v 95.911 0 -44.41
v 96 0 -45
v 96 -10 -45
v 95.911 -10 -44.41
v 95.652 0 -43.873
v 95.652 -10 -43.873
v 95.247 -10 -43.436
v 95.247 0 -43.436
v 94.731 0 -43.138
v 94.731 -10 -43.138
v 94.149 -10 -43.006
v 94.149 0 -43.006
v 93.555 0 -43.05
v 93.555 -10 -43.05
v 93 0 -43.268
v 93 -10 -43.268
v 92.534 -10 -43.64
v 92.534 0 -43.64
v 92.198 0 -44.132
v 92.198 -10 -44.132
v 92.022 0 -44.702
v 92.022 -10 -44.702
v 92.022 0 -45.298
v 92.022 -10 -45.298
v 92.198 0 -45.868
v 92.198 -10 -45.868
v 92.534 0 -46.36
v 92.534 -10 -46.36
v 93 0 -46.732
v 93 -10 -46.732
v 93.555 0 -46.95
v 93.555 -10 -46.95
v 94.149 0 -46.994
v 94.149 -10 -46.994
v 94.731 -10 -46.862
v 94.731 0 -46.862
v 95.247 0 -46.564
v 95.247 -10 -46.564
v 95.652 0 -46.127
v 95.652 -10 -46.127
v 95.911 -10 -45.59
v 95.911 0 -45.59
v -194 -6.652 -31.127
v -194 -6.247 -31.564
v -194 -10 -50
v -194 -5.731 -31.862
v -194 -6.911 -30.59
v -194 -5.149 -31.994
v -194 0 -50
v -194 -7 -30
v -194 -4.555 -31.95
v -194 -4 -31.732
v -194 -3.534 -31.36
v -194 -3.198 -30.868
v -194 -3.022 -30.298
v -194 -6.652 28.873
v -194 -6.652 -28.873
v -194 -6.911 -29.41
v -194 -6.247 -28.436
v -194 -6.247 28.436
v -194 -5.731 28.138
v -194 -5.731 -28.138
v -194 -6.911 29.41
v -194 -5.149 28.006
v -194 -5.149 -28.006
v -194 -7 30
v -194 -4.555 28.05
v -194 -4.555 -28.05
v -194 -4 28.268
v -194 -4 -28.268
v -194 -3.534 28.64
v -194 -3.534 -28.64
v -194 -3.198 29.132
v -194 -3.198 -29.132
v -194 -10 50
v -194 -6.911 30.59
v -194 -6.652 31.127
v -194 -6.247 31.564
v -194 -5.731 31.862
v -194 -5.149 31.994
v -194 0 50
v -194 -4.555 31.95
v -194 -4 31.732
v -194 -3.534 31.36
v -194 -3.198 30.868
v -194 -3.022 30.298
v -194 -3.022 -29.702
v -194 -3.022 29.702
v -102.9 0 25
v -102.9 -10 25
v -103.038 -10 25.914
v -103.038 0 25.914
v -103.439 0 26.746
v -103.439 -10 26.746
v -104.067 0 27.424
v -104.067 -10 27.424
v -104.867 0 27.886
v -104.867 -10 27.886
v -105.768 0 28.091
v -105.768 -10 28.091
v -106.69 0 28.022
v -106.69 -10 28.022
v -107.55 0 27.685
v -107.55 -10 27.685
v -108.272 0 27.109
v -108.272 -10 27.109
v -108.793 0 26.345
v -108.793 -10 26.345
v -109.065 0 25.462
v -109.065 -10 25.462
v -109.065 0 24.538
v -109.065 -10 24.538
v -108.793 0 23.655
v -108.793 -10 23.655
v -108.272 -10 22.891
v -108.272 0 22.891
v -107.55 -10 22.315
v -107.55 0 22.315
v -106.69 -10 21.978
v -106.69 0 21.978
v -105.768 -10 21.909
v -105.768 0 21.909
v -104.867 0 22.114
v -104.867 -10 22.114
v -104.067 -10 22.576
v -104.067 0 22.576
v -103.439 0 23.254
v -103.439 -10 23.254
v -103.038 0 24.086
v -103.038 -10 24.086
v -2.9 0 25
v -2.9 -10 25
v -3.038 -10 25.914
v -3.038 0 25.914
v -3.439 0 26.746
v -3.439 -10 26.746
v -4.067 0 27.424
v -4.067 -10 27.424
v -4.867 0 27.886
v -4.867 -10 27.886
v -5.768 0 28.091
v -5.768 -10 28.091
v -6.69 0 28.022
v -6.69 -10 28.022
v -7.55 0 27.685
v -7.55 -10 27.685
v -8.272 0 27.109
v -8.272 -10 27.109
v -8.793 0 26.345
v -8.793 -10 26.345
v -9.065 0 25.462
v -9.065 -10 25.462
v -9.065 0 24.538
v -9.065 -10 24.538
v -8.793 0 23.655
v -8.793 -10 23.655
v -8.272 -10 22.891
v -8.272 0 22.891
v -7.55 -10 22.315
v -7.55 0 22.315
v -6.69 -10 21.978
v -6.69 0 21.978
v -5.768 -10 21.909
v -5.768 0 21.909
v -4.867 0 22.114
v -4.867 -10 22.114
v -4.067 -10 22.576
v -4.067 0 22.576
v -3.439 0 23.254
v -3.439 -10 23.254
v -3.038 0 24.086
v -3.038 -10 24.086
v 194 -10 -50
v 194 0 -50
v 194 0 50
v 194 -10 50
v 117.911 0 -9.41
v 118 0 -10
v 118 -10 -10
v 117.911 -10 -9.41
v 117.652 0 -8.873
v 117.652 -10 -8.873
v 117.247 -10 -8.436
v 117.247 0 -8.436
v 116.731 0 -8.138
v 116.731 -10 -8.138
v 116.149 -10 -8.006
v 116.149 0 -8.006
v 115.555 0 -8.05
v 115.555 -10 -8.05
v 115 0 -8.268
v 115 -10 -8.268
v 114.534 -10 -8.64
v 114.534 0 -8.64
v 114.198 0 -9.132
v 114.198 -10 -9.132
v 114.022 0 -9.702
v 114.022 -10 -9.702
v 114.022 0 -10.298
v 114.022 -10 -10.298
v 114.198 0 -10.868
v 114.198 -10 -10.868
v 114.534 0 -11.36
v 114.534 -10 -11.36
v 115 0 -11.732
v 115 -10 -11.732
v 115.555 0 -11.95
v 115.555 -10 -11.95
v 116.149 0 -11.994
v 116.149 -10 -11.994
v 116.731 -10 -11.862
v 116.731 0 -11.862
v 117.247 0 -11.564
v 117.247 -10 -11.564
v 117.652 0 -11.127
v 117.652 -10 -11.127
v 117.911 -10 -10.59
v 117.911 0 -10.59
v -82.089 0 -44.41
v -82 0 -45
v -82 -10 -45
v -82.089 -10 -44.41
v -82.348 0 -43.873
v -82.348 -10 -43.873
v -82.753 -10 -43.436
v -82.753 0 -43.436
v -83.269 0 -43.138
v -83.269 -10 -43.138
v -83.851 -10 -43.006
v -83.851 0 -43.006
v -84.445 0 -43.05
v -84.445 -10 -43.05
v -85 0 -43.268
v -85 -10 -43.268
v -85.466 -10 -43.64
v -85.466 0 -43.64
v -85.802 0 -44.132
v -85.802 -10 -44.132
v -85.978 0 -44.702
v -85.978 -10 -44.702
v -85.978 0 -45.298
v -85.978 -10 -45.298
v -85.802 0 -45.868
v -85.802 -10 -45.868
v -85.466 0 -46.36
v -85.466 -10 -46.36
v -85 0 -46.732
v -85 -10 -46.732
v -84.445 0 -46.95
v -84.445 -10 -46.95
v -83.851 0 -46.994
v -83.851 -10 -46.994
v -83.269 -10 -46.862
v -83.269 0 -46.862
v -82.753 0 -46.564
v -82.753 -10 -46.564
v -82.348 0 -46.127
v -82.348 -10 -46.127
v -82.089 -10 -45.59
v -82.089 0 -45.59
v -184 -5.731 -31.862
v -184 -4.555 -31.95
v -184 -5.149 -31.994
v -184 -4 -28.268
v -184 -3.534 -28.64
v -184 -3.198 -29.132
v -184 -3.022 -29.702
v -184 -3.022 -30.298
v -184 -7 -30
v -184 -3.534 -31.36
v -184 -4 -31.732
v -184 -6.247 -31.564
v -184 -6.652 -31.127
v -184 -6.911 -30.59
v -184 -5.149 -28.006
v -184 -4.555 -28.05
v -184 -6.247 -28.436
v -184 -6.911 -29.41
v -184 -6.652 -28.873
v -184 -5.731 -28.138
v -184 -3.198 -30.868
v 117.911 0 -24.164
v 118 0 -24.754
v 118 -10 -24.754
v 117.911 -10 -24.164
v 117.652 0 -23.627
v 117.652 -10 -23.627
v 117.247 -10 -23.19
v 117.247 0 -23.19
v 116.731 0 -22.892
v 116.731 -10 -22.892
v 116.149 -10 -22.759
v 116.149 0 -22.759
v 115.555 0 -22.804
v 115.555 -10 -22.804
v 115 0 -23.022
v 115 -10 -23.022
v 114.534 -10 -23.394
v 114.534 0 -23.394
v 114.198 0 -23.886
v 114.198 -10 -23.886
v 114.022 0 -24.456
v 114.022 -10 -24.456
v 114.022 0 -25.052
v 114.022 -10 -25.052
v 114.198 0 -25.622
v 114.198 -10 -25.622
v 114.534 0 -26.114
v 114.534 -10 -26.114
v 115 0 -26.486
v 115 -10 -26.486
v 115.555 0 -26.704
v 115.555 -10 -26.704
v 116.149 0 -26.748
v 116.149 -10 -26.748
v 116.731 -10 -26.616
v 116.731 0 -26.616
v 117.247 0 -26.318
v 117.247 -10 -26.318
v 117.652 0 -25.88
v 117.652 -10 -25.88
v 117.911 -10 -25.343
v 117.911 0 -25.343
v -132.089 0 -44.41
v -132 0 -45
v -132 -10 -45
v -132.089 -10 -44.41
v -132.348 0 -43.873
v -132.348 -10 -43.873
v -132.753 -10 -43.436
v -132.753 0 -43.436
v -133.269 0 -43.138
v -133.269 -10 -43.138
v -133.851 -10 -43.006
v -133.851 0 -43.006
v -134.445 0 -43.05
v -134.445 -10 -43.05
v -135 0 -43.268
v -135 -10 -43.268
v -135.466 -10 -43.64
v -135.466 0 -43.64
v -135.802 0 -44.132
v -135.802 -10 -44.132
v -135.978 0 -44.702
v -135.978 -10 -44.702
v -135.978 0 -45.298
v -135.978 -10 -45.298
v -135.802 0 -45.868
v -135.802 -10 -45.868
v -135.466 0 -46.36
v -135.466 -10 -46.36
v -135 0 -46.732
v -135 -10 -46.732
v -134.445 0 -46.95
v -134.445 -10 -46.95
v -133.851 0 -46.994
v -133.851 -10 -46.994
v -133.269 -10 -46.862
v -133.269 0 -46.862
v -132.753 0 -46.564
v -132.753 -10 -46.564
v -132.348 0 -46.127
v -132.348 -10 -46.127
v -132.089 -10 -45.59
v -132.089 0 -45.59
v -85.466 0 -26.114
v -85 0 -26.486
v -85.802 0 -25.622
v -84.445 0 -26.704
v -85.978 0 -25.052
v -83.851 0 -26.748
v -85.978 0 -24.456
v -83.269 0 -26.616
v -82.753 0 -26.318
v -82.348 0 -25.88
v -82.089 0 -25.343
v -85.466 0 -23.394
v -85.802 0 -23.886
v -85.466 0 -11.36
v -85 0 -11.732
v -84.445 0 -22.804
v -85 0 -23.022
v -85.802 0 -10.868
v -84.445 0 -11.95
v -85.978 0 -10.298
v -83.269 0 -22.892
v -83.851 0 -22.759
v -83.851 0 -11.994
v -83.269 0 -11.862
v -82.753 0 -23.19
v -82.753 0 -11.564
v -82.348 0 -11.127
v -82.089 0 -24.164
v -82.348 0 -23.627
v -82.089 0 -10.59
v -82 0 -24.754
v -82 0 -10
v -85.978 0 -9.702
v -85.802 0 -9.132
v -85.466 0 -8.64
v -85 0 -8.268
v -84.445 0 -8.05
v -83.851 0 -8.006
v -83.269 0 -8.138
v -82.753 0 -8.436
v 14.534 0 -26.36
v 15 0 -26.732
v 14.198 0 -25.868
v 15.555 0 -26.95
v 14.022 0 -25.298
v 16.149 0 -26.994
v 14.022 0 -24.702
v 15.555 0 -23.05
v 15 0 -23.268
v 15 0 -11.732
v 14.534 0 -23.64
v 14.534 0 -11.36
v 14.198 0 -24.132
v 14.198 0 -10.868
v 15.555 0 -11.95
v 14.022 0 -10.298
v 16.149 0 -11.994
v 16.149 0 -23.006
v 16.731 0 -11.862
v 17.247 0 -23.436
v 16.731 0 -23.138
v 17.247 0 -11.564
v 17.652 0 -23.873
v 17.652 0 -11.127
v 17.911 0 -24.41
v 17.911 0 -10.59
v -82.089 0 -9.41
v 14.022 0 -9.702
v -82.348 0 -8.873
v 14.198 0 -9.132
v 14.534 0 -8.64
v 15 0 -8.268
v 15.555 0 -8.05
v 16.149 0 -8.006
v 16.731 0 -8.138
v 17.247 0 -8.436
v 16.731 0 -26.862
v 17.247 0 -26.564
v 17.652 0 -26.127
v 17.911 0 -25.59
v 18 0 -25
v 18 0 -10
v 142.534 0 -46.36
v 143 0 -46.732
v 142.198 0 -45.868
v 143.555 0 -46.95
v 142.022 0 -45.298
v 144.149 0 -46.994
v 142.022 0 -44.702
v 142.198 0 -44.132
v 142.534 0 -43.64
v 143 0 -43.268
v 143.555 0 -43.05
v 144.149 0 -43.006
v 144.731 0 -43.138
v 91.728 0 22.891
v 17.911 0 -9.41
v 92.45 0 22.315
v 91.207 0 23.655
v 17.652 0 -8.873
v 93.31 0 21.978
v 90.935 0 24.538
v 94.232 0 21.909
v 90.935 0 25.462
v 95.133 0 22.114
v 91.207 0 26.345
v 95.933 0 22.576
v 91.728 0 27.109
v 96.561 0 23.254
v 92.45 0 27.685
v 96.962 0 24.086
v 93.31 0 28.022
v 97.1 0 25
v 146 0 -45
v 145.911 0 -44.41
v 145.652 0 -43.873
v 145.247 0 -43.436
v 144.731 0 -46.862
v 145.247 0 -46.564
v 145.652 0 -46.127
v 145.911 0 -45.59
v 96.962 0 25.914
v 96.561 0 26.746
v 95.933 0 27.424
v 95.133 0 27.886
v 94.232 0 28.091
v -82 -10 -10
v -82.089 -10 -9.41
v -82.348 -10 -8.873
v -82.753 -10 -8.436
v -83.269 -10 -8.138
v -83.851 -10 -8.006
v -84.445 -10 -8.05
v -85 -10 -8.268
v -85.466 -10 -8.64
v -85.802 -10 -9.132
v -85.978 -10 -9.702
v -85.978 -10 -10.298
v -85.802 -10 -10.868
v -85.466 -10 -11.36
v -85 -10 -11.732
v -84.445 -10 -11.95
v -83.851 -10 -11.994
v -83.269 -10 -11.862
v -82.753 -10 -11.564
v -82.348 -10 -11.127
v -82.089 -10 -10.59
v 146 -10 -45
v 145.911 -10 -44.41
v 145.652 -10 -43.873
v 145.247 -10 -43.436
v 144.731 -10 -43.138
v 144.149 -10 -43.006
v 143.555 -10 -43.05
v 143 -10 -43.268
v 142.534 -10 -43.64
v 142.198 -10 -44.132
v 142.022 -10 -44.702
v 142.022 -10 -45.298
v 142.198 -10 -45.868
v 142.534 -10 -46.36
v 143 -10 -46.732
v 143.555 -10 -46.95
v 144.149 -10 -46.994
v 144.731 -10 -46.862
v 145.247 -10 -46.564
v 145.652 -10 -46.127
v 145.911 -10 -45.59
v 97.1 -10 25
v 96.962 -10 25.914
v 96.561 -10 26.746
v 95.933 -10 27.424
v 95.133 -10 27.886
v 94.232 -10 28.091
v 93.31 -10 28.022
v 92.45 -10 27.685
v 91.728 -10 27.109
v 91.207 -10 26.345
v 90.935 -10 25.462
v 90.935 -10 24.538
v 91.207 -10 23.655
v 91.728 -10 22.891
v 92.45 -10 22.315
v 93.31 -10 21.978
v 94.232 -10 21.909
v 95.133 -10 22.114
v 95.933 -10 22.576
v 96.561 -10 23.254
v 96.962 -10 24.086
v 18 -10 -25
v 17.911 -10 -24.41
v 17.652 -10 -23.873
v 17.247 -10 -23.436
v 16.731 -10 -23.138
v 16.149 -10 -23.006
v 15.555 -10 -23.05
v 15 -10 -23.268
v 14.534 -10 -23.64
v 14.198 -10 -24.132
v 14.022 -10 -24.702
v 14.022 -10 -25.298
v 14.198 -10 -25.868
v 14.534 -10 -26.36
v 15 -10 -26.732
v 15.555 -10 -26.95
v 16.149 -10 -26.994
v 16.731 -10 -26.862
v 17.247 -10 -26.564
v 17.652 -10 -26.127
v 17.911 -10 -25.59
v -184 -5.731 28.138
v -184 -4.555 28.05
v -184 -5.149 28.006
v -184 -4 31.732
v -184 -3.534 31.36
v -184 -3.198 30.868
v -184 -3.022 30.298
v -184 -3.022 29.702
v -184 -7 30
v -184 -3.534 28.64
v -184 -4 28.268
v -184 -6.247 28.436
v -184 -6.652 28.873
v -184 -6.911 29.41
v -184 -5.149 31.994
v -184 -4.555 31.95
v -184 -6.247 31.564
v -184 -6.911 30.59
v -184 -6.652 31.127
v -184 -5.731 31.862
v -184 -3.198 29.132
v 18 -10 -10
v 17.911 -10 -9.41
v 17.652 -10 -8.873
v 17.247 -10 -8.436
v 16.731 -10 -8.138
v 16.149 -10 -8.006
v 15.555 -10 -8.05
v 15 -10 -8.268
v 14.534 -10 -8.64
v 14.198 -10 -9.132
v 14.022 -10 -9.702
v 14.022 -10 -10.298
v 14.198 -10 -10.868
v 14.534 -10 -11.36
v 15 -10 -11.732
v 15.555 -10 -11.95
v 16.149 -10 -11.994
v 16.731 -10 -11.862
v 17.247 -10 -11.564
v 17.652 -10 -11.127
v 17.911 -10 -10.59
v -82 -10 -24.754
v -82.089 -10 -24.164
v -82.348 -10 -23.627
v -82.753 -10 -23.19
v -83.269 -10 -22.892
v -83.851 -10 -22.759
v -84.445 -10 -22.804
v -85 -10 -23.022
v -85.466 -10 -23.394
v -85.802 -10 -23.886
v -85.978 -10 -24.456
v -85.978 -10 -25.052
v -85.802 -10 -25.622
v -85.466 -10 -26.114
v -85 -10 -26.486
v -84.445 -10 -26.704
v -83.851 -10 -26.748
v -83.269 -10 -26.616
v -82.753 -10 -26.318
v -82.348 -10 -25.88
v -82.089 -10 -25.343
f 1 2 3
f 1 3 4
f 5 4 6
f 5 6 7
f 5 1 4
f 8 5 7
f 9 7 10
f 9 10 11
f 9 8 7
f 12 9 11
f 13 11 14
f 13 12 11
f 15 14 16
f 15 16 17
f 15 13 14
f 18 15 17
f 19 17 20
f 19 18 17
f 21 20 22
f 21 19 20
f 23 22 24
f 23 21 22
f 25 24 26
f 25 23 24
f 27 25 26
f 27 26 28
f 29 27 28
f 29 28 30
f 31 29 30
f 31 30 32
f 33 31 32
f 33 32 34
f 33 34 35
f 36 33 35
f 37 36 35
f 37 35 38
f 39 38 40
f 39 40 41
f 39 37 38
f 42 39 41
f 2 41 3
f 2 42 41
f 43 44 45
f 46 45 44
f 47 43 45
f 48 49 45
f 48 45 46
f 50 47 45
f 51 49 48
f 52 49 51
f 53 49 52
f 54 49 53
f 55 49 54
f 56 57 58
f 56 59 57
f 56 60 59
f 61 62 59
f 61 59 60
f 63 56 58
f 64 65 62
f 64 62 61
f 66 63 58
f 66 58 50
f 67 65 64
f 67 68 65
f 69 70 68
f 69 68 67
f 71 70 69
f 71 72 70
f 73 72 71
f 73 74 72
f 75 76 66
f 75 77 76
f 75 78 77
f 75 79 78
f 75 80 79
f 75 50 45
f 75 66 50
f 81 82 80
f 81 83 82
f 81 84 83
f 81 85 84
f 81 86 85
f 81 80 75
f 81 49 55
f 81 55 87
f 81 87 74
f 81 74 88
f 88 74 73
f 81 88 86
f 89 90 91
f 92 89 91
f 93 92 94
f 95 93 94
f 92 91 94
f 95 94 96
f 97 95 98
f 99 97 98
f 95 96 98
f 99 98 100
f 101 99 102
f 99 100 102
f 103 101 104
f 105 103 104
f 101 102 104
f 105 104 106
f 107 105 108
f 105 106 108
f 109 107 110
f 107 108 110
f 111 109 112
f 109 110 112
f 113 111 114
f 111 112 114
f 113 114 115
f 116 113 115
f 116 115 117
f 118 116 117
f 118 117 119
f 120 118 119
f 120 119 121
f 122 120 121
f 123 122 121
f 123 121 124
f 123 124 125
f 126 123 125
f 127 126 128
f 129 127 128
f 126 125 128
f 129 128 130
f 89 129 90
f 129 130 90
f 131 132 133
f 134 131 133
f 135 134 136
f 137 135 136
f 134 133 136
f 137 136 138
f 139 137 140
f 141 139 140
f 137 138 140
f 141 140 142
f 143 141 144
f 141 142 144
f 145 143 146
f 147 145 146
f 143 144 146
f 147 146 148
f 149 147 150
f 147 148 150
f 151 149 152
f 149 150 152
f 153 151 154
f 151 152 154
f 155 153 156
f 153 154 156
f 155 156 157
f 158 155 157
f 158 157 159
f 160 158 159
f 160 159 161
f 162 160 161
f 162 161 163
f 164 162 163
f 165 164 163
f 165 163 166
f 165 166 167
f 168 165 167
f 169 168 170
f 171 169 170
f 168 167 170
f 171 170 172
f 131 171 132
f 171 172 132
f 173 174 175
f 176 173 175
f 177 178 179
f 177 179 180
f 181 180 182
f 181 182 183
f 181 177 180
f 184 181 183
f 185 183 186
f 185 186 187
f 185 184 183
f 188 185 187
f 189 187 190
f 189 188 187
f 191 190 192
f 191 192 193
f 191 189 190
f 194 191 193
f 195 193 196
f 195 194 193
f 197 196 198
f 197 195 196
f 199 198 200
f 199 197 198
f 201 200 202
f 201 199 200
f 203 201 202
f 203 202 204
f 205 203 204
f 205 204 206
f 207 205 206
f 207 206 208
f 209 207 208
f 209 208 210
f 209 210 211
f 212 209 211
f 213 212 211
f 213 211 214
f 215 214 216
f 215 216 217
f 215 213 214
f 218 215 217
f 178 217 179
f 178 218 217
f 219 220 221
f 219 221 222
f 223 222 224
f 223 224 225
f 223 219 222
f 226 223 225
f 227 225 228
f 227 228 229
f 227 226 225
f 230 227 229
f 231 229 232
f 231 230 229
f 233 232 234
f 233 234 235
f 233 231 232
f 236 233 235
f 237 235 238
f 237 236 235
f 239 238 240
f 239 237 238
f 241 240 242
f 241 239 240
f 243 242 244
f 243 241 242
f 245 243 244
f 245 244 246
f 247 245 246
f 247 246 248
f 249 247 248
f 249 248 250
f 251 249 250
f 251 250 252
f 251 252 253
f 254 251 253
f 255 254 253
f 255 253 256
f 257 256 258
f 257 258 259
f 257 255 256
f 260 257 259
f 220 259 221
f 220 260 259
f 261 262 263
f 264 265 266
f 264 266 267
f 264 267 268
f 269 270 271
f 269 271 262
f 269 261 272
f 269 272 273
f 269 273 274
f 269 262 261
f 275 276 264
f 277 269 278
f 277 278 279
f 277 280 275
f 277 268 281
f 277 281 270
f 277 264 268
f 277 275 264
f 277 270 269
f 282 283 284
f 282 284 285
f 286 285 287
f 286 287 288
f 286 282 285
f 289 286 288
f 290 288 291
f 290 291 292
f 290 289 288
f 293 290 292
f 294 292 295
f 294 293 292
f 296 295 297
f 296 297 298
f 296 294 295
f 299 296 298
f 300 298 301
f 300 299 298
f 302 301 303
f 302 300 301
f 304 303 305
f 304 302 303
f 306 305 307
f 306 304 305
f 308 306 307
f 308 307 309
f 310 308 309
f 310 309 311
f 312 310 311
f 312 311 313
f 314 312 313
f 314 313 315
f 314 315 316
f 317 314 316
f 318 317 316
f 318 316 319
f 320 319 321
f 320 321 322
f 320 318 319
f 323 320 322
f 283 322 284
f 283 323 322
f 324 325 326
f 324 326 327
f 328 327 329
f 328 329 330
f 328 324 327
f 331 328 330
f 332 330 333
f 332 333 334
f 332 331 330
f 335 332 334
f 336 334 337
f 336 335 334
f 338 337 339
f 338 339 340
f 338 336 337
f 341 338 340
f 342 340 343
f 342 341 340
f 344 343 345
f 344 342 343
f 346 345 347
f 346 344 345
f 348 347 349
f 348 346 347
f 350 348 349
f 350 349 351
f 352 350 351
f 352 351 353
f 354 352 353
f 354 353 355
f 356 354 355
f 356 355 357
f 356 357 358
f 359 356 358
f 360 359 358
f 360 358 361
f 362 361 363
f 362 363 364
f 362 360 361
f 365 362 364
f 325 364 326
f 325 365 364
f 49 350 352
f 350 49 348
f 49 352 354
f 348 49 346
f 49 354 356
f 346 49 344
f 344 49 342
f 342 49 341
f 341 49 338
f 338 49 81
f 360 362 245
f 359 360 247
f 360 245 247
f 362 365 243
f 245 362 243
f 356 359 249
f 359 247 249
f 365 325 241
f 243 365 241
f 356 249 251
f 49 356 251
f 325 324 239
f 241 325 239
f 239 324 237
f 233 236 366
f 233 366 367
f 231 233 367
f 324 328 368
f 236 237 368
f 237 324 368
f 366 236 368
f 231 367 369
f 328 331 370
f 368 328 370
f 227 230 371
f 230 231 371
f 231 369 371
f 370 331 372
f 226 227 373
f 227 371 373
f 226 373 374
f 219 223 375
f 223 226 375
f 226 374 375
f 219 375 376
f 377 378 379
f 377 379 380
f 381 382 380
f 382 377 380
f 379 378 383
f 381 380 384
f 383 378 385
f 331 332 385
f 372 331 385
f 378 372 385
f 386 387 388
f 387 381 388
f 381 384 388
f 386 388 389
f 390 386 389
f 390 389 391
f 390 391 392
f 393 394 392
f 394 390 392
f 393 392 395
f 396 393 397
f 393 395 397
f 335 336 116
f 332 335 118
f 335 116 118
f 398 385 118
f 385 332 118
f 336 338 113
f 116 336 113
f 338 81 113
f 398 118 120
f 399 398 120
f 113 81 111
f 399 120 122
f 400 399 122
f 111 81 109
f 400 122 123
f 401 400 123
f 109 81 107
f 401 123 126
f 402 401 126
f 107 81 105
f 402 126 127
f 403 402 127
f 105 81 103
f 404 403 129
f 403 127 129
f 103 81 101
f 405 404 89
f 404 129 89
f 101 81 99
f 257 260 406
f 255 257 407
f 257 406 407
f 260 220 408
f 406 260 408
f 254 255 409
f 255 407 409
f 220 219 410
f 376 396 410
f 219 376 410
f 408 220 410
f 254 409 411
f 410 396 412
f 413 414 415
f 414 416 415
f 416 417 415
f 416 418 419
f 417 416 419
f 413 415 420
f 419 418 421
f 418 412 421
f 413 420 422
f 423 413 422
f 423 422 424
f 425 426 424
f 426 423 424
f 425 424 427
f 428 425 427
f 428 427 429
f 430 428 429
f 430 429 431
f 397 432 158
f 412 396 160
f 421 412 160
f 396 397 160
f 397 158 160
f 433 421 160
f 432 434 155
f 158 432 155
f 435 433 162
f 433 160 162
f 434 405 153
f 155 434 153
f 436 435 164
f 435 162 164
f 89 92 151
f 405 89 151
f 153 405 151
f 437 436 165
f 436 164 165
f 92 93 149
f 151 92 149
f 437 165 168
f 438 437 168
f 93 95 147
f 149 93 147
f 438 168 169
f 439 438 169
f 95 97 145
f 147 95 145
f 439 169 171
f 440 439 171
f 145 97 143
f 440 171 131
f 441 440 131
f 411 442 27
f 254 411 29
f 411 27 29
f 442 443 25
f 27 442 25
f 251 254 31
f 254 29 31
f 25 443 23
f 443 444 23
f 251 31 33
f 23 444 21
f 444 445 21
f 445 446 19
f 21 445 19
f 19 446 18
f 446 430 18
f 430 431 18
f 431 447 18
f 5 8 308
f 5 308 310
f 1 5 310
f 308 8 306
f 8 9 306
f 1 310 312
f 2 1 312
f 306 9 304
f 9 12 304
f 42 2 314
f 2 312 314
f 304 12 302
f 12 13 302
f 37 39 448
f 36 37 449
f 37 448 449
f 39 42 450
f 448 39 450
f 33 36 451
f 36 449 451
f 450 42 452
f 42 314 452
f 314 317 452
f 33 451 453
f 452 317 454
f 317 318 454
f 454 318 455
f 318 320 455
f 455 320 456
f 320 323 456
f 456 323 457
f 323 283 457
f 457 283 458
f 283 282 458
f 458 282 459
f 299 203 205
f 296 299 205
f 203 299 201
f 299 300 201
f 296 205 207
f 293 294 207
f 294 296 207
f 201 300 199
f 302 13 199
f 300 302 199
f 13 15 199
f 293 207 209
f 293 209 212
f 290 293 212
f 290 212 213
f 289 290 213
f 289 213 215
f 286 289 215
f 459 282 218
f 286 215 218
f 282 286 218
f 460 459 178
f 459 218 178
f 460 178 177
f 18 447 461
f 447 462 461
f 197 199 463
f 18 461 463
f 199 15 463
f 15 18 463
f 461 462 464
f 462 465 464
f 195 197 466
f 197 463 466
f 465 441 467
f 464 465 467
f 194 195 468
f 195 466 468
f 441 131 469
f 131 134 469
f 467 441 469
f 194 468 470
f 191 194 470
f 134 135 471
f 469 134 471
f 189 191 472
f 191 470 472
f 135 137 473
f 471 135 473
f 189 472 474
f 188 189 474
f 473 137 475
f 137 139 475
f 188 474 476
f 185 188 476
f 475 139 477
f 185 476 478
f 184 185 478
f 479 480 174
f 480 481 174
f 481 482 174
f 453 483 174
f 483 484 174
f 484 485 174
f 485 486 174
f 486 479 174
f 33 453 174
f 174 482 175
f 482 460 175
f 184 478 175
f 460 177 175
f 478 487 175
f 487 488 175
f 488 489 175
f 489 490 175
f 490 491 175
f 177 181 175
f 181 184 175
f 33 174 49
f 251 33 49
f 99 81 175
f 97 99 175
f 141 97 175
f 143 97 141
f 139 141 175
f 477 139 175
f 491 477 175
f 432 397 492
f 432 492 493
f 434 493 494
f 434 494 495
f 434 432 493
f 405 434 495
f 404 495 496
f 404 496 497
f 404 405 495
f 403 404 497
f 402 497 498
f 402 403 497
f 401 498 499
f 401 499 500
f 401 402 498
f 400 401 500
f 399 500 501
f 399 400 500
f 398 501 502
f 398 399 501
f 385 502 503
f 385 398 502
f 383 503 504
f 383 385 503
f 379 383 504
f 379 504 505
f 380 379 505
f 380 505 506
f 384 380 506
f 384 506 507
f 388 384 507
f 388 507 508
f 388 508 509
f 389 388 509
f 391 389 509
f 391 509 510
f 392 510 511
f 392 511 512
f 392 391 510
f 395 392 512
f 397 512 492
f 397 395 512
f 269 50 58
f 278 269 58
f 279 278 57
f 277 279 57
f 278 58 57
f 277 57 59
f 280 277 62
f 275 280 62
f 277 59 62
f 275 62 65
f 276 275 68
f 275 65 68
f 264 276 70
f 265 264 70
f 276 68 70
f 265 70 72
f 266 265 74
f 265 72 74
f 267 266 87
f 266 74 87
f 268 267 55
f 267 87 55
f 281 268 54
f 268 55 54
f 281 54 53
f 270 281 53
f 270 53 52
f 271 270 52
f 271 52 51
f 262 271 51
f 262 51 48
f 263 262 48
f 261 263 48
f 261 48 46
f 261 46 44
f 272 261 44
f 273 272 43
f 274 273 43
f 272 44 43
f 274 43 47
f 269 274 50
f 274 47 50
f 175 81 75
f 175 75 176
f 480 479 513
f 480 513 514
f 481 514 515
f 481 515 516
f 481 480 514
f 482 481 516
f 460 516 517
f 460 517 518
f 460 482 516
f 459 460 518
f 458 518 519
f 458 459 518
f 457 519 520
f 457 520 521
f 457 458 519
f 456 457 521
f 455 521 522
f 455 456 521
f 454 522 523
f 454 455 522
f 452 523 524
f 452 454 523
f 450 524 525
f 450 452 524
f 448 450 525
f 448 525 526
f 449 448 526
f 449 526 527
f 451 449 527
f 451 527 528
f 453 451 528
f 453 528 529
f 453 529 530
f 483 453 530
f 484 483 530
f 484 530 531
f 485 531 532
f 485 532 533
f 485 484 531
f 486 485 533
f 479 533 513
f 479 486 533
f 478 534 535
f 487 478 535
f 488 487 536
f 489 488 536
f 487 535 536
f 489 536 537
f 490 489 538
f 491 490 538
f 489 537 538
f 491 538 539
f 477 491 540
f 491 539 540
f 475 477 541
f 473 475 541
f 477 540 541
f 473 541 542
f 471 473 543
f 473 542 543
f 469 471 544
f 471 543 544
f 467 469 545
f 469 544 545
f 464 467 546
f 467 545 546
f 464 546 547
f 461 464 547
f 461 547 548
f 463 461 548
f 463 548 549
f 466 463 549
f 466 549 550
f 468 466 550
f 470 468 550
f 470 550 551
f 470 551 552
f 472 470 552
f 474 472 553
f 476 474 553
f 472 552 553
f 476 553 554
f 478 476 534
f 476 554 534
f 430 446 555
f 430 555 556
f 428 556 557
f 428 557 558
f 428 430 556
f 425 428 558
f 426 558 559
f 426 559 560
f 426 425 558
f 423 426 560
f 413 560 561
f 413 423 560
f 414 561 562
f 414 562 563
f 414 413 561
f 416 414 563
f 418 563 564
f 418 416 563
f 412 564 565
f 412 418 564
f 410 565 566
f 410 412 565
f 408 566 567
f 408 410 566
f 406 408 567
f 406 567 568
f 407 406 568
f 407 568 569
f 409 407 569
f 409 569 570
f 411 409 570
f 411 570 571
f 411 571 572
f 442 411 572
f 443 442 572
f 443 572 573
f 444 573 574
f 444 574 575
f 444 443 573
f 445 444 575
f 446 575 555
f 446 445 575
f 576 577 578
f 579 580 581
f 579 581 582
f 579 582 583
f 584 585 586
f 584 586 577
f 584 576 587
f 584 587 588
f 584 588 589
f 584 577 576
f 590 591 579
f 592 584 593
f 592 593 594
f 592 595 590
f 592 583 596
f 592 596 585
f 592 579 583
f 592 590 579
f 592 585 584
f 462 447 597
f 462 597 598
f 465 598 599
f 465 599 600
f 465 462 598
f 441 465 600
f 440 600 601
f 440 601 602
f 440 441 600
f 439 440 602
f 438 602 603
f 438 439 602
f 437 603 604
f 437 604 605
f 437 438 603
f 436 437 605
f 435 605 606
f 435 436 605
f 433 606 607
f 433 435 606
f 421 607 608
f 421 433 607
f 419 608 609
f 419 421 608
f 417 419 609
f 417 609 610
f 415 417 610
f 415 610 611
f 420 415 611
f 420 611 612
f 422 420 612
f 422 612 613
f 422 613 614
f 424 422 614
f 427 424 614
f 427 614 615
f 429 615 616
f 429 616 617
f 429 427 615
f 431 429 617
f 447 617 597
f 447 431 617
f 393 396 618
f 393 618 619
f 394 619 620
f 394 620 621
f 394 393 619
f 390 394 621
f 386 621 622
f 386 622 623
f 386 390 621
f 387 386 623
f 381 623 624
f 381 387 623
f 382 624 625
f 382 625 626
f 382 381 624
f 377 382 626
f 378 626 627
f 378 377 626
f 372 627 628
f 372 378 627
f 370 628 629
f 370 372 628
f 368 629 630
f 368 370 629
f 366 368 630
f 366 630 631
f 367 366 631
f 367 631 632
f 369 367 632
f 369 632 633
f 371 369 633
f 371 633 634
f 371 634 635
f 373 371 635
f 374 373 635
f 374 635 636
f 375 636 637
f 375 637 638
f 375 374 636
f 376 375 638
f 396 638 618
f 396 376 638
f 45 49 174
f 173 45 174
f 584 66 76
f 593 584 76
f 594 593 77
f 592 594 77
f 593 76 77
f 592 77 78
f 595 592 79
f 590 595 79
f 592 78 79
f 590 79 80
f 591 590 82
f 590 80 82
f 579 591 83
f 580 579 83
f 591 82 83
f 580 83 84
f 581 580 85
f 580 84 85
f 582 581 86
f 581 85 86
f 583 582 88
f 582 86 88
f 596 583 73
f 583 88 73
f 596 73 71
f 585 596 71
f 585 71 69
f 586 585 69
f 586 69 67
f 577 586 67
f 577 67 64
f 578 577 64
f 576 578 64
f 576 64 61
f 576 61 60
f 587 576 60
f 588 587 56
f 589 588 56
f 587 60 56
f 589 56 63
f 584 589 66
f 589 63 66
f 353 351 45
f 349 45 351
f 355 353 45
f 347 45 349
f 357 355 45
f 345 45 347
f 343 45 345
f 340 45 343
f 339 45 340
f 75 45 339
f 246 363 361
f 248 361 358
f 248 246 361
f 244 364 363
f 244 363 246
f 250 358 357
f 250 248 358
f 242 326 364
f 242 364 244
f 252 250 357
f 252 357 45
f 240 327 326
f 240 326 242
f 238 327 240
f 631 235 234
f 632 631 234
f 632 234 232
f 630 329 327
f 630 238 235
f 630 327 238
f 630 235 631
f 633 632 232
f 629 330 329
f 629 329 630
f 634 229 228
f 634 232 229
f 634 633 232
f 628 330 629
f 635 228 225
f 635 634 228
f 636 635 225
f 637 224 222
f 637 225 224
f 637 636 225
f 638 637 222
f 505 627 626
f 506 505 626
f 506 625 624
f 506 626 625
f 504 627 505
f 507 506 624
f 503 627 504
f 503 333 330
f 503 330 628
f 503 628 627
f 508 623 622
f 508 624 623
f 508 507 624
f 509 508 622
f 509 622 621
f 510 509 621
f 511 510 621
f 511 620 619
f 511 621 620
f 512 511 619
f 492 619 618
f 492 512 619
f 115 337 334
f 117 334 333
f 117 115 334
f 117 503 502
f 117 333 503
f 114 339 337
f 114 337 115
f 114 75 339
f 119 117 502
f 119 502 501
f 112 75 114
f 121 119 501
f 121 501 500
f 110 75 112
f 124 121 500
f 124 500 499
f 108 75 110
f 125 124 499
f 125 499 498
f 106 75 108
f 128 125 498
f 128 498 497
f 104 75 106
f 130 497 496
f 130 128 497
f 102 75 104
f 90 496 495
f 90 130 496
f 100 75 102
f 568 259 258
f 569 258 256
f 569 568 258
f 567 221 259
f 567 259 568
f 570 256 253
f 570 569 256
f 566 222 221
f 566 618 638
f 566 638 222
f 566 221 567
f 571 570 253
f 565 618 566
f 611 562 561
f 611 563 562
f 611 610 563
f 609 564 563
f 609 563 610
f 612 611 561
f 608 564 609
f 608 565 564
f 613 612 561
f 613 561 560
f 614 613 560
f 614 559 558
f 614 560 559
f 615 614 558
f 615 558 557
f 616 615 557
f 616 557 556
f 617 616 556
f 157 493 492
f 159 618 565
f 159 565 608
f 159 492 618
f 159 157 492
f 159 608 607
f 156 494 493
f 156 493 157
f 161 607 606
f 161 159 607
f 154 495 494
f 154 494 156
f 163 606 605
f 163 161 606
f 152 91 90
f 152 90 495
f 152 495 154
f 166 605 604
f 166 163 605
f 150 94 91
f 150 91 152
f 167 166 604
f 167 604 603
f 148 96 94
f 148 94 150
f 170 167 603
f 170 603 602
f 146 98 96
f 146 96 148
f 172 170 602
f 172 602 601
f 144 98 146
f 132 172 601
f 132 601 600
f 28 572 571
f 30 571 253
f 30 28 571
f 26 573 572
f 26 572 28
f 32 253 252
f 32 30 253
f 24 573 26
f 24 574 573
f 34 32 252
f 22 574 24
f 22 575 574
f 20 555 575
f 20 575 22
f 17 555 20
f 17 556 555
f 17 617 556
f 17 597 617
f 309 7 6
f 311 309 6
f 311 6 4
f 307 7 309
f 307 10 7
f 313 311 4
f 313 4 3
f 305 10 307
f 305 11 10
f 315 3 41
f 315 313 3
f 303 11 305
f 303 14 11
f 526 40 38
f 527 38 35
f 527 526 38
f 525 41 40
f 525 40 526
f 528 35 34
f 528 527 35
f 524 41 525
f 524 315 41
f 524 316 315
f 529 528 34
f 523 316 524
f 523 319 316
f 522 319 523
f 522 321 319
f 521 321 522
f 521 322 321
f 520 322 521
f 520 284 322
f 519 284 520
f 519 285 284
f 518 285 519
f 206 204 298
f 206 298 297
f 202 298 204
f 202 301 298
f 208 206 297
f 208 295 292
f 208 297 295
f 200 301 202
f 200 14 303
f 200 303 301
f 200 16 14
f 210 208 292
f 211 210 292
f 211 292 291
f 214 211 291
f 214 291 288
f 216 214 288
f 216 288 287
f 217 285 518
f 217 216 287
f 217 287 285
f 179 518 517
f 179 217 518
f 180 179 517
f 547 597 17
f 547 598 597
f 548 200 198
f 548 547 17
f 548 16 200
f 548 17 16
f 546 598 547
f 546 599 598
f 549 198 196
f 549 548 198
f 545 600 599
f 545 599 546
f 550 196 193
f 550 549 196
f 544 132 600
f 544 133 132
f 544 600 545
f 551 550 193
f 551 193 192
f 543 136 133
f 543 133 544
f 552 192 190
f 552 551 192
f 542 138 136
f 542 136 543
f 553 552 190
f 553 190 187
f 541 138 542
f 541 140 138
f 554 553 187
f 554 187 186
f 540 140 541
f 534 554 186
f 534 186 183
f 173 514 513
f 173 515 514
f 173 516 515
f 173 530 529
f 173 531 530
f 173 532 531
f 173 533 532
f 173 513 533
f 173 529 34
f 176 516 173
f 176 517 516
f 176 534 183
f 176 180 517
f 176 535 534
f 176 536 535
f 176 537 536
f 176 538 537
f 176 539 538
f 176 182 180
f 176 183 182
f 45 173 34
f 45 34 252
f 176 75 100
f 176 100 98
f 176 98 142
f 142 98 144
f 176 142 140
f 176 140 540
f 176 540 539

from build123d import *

# Parameters (mm, degrees)
F0_W     = 388
F0_H     = 100
F0_R     = 2
F1_DEPTH = 10
F2_R     = 3.1
F3_DEPTH = 10
F4_R     = 2
F5_DEPTH = 10


with BuildPart() as f1:
    # F0 (on Front) → F1 (new body)
    with BuildSketch(Plane.XZ):
        Rectangle(F0_W, F0_H)
        with Locations((-134, -45)):
            Circle(F0_R, mode=Mode.SUBTRACT)
        with Locations((-84, -45)):
            Circle(F0_R, mode=Mode.SUBTRACT)
        with Locations((-84, -24.753856)):
            Circle(F0_R, mode=Mode.SUBTRACT)
        with Locations((-84, -10)):
            Circle(F0_R, mode=Mode.SUBTRACT)
        with Locations((94, -45)):
            Circle(F0_R, mode=Mode.SUBTRACT)
        with Locations((144, -45)):
            Circle(F0_R, mode=Mode.SUBTRACT)
        with Locations((16, -25)):
            Circle(F0_R, mode=Mode.SUBTRACT)
        with Locations((16, -10)):
            Circle(F0_R, mode=Mode.SUBTRACT)
        with Locations((116, -24.753856)):
            Circle(F0_R, mode=Mode.SUBTRACT)
        with Locations((116, -10)):
            Circle(F0_R, mode=Mode.SUBTRACT)
    extrude(amount=F1_DEPTH)

    # F2 (on face) → F3 (cut)
    with BuildSketch(Plane.XZ.offset(10)):
        with Locations((-6, 25)):
            Circle(F2_R)
        with Locations((94, 25)):
            Circle(F2_R)
        with Locations((-106, 25)):
            Circle(F2_R)
    extrude(amount=-F3_DEPTH, mode=Mode.SUBTRACT)

    # F4 (on face) → F5 (cut)
    with BuildSketch(Plane(origin=(-194, 0, 0), x_dir=(0, -1, 0), z_dir=(-1, 0, 0))):
        with Locations((5, -30)):
            Circle(F4_R)
        with Locations((5, 30)):
            Circle(F4_R)
    extrude(amount=-F5_DEPTH, mode=Mode.SUBTRACT)


solid = f1.part
